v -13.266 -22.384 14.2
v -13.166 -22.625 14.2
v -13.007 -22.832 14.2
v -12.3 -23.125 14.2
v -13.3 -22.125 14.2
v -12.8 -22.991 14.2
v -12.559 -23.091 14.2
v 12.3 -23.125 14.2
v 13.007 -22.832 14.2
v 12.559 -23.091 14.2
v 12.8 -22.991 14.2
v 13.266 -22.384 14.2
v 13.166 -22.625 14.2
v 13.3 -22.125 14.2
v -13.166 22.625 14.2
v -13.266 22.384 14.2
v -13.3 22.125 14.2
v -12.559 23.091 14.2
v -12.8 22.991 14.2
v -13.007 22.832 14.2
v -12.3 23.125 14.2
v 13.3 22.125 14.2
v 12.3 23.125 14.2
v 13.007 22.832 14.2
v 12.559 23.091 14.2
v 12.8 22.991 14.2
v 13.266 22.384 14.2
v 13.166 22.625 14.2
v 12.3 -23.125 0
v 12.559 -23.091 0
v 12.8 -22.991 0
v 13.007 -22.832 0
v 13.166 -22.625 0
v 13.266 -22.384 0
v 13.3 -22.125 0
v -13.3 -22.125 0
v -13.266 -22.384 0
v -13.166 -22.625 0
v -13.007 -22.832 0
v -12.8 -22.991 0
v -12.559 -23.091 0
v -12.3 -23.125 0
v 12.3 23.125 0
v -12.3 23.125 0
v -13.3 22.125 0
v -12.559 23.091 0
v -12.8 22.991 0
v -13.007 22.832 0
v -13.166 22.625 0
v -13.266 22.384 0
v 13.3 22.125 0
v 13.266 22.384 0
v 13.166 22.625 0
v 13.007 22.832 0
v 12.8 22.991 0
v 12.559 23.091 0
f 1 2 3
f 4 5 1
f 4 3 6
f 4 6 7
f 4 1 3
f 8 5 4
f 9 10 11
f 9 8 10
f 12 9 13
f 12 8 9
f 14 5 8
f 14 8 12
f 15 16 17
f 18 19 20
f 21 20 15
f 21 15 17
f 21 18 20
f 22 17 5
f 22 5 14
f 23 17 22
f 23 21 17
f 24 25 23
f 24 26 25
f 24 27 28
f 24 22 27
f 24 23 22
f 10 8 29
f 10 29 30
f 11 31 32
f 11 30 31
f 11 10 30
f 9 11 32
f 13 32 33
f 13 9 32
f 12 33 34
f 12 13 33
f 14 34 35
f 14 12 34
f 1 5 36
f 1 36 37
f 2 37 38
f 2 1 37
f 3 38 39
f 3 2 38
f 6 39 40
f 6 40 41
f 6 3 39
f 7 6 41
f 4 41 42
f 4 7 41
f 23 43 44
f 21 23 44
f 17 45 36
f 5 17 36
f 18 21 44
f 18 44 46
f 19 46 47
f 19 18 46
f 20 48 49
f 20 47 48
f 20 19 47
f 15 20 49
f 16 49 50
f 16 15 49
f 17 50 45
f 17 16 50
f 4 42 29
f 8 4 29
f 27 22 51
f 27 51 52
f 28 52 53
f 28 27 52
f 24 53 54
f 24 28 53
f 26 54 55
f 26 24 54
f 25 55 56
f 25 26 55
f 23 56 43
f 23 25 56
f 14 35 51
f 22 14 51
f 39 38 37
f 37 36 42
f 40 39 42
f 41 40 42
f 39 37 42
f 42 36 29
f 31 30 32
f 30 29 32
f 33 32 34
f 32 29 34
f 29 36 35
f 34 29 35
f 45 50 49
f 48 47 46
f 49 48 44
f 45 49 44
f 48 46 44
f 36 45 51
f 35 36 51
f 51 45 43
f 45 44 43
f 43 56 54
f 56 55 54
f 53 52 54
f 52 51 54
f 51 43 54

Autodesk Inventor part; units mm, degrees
ref_plane "YZ Plane" through (0, 0, 0) normal (1, 0, 0) x (0, 1, 0)
ref_plane "XZ Plane" through (0, 0, 0) normal (0, 1, 0) x (-1, 0, 0)
ref_plane "XY Plane" through (0, 0, 0) normal (0, 0, 1) x (1, 0, 0)
sketch "Sketch1" plane through (0, 0, 0) normal (0, 0, 1) x (1, 0, 0)
  line L0 (-13.3, -23.125) -> (13.3, -23.125)
  line L1 (13.3, -23.125) -> (13.3, 23.125)
  line L2 (13.3, 23.125) -> (-13.3, 23.125)
  line L3 (-13.3, 23.125) -> (-13.3, -23.125)
  line L4 (-13.3, -23.125) -> (13.3, 23.125) construction
  line L5 (13.3, -23.125) -> (-13.3, 23.125) construction
  point P0 (0, 0)
  dimension "d0" = 26.6
  dimension "d1" = 46.25
extrude "Extrusion1" add sketch "Sketch1" along normal blind 14.2
fillet "Fillet1" radius 1 4 edges at (13.3, -23.125, 7.1) (-13.3, -23.125, 7.1) (13.3, 23.125, 7.1) (-13.3, 23.125, 7.1)
properties part number "FrSky_RX8R"
